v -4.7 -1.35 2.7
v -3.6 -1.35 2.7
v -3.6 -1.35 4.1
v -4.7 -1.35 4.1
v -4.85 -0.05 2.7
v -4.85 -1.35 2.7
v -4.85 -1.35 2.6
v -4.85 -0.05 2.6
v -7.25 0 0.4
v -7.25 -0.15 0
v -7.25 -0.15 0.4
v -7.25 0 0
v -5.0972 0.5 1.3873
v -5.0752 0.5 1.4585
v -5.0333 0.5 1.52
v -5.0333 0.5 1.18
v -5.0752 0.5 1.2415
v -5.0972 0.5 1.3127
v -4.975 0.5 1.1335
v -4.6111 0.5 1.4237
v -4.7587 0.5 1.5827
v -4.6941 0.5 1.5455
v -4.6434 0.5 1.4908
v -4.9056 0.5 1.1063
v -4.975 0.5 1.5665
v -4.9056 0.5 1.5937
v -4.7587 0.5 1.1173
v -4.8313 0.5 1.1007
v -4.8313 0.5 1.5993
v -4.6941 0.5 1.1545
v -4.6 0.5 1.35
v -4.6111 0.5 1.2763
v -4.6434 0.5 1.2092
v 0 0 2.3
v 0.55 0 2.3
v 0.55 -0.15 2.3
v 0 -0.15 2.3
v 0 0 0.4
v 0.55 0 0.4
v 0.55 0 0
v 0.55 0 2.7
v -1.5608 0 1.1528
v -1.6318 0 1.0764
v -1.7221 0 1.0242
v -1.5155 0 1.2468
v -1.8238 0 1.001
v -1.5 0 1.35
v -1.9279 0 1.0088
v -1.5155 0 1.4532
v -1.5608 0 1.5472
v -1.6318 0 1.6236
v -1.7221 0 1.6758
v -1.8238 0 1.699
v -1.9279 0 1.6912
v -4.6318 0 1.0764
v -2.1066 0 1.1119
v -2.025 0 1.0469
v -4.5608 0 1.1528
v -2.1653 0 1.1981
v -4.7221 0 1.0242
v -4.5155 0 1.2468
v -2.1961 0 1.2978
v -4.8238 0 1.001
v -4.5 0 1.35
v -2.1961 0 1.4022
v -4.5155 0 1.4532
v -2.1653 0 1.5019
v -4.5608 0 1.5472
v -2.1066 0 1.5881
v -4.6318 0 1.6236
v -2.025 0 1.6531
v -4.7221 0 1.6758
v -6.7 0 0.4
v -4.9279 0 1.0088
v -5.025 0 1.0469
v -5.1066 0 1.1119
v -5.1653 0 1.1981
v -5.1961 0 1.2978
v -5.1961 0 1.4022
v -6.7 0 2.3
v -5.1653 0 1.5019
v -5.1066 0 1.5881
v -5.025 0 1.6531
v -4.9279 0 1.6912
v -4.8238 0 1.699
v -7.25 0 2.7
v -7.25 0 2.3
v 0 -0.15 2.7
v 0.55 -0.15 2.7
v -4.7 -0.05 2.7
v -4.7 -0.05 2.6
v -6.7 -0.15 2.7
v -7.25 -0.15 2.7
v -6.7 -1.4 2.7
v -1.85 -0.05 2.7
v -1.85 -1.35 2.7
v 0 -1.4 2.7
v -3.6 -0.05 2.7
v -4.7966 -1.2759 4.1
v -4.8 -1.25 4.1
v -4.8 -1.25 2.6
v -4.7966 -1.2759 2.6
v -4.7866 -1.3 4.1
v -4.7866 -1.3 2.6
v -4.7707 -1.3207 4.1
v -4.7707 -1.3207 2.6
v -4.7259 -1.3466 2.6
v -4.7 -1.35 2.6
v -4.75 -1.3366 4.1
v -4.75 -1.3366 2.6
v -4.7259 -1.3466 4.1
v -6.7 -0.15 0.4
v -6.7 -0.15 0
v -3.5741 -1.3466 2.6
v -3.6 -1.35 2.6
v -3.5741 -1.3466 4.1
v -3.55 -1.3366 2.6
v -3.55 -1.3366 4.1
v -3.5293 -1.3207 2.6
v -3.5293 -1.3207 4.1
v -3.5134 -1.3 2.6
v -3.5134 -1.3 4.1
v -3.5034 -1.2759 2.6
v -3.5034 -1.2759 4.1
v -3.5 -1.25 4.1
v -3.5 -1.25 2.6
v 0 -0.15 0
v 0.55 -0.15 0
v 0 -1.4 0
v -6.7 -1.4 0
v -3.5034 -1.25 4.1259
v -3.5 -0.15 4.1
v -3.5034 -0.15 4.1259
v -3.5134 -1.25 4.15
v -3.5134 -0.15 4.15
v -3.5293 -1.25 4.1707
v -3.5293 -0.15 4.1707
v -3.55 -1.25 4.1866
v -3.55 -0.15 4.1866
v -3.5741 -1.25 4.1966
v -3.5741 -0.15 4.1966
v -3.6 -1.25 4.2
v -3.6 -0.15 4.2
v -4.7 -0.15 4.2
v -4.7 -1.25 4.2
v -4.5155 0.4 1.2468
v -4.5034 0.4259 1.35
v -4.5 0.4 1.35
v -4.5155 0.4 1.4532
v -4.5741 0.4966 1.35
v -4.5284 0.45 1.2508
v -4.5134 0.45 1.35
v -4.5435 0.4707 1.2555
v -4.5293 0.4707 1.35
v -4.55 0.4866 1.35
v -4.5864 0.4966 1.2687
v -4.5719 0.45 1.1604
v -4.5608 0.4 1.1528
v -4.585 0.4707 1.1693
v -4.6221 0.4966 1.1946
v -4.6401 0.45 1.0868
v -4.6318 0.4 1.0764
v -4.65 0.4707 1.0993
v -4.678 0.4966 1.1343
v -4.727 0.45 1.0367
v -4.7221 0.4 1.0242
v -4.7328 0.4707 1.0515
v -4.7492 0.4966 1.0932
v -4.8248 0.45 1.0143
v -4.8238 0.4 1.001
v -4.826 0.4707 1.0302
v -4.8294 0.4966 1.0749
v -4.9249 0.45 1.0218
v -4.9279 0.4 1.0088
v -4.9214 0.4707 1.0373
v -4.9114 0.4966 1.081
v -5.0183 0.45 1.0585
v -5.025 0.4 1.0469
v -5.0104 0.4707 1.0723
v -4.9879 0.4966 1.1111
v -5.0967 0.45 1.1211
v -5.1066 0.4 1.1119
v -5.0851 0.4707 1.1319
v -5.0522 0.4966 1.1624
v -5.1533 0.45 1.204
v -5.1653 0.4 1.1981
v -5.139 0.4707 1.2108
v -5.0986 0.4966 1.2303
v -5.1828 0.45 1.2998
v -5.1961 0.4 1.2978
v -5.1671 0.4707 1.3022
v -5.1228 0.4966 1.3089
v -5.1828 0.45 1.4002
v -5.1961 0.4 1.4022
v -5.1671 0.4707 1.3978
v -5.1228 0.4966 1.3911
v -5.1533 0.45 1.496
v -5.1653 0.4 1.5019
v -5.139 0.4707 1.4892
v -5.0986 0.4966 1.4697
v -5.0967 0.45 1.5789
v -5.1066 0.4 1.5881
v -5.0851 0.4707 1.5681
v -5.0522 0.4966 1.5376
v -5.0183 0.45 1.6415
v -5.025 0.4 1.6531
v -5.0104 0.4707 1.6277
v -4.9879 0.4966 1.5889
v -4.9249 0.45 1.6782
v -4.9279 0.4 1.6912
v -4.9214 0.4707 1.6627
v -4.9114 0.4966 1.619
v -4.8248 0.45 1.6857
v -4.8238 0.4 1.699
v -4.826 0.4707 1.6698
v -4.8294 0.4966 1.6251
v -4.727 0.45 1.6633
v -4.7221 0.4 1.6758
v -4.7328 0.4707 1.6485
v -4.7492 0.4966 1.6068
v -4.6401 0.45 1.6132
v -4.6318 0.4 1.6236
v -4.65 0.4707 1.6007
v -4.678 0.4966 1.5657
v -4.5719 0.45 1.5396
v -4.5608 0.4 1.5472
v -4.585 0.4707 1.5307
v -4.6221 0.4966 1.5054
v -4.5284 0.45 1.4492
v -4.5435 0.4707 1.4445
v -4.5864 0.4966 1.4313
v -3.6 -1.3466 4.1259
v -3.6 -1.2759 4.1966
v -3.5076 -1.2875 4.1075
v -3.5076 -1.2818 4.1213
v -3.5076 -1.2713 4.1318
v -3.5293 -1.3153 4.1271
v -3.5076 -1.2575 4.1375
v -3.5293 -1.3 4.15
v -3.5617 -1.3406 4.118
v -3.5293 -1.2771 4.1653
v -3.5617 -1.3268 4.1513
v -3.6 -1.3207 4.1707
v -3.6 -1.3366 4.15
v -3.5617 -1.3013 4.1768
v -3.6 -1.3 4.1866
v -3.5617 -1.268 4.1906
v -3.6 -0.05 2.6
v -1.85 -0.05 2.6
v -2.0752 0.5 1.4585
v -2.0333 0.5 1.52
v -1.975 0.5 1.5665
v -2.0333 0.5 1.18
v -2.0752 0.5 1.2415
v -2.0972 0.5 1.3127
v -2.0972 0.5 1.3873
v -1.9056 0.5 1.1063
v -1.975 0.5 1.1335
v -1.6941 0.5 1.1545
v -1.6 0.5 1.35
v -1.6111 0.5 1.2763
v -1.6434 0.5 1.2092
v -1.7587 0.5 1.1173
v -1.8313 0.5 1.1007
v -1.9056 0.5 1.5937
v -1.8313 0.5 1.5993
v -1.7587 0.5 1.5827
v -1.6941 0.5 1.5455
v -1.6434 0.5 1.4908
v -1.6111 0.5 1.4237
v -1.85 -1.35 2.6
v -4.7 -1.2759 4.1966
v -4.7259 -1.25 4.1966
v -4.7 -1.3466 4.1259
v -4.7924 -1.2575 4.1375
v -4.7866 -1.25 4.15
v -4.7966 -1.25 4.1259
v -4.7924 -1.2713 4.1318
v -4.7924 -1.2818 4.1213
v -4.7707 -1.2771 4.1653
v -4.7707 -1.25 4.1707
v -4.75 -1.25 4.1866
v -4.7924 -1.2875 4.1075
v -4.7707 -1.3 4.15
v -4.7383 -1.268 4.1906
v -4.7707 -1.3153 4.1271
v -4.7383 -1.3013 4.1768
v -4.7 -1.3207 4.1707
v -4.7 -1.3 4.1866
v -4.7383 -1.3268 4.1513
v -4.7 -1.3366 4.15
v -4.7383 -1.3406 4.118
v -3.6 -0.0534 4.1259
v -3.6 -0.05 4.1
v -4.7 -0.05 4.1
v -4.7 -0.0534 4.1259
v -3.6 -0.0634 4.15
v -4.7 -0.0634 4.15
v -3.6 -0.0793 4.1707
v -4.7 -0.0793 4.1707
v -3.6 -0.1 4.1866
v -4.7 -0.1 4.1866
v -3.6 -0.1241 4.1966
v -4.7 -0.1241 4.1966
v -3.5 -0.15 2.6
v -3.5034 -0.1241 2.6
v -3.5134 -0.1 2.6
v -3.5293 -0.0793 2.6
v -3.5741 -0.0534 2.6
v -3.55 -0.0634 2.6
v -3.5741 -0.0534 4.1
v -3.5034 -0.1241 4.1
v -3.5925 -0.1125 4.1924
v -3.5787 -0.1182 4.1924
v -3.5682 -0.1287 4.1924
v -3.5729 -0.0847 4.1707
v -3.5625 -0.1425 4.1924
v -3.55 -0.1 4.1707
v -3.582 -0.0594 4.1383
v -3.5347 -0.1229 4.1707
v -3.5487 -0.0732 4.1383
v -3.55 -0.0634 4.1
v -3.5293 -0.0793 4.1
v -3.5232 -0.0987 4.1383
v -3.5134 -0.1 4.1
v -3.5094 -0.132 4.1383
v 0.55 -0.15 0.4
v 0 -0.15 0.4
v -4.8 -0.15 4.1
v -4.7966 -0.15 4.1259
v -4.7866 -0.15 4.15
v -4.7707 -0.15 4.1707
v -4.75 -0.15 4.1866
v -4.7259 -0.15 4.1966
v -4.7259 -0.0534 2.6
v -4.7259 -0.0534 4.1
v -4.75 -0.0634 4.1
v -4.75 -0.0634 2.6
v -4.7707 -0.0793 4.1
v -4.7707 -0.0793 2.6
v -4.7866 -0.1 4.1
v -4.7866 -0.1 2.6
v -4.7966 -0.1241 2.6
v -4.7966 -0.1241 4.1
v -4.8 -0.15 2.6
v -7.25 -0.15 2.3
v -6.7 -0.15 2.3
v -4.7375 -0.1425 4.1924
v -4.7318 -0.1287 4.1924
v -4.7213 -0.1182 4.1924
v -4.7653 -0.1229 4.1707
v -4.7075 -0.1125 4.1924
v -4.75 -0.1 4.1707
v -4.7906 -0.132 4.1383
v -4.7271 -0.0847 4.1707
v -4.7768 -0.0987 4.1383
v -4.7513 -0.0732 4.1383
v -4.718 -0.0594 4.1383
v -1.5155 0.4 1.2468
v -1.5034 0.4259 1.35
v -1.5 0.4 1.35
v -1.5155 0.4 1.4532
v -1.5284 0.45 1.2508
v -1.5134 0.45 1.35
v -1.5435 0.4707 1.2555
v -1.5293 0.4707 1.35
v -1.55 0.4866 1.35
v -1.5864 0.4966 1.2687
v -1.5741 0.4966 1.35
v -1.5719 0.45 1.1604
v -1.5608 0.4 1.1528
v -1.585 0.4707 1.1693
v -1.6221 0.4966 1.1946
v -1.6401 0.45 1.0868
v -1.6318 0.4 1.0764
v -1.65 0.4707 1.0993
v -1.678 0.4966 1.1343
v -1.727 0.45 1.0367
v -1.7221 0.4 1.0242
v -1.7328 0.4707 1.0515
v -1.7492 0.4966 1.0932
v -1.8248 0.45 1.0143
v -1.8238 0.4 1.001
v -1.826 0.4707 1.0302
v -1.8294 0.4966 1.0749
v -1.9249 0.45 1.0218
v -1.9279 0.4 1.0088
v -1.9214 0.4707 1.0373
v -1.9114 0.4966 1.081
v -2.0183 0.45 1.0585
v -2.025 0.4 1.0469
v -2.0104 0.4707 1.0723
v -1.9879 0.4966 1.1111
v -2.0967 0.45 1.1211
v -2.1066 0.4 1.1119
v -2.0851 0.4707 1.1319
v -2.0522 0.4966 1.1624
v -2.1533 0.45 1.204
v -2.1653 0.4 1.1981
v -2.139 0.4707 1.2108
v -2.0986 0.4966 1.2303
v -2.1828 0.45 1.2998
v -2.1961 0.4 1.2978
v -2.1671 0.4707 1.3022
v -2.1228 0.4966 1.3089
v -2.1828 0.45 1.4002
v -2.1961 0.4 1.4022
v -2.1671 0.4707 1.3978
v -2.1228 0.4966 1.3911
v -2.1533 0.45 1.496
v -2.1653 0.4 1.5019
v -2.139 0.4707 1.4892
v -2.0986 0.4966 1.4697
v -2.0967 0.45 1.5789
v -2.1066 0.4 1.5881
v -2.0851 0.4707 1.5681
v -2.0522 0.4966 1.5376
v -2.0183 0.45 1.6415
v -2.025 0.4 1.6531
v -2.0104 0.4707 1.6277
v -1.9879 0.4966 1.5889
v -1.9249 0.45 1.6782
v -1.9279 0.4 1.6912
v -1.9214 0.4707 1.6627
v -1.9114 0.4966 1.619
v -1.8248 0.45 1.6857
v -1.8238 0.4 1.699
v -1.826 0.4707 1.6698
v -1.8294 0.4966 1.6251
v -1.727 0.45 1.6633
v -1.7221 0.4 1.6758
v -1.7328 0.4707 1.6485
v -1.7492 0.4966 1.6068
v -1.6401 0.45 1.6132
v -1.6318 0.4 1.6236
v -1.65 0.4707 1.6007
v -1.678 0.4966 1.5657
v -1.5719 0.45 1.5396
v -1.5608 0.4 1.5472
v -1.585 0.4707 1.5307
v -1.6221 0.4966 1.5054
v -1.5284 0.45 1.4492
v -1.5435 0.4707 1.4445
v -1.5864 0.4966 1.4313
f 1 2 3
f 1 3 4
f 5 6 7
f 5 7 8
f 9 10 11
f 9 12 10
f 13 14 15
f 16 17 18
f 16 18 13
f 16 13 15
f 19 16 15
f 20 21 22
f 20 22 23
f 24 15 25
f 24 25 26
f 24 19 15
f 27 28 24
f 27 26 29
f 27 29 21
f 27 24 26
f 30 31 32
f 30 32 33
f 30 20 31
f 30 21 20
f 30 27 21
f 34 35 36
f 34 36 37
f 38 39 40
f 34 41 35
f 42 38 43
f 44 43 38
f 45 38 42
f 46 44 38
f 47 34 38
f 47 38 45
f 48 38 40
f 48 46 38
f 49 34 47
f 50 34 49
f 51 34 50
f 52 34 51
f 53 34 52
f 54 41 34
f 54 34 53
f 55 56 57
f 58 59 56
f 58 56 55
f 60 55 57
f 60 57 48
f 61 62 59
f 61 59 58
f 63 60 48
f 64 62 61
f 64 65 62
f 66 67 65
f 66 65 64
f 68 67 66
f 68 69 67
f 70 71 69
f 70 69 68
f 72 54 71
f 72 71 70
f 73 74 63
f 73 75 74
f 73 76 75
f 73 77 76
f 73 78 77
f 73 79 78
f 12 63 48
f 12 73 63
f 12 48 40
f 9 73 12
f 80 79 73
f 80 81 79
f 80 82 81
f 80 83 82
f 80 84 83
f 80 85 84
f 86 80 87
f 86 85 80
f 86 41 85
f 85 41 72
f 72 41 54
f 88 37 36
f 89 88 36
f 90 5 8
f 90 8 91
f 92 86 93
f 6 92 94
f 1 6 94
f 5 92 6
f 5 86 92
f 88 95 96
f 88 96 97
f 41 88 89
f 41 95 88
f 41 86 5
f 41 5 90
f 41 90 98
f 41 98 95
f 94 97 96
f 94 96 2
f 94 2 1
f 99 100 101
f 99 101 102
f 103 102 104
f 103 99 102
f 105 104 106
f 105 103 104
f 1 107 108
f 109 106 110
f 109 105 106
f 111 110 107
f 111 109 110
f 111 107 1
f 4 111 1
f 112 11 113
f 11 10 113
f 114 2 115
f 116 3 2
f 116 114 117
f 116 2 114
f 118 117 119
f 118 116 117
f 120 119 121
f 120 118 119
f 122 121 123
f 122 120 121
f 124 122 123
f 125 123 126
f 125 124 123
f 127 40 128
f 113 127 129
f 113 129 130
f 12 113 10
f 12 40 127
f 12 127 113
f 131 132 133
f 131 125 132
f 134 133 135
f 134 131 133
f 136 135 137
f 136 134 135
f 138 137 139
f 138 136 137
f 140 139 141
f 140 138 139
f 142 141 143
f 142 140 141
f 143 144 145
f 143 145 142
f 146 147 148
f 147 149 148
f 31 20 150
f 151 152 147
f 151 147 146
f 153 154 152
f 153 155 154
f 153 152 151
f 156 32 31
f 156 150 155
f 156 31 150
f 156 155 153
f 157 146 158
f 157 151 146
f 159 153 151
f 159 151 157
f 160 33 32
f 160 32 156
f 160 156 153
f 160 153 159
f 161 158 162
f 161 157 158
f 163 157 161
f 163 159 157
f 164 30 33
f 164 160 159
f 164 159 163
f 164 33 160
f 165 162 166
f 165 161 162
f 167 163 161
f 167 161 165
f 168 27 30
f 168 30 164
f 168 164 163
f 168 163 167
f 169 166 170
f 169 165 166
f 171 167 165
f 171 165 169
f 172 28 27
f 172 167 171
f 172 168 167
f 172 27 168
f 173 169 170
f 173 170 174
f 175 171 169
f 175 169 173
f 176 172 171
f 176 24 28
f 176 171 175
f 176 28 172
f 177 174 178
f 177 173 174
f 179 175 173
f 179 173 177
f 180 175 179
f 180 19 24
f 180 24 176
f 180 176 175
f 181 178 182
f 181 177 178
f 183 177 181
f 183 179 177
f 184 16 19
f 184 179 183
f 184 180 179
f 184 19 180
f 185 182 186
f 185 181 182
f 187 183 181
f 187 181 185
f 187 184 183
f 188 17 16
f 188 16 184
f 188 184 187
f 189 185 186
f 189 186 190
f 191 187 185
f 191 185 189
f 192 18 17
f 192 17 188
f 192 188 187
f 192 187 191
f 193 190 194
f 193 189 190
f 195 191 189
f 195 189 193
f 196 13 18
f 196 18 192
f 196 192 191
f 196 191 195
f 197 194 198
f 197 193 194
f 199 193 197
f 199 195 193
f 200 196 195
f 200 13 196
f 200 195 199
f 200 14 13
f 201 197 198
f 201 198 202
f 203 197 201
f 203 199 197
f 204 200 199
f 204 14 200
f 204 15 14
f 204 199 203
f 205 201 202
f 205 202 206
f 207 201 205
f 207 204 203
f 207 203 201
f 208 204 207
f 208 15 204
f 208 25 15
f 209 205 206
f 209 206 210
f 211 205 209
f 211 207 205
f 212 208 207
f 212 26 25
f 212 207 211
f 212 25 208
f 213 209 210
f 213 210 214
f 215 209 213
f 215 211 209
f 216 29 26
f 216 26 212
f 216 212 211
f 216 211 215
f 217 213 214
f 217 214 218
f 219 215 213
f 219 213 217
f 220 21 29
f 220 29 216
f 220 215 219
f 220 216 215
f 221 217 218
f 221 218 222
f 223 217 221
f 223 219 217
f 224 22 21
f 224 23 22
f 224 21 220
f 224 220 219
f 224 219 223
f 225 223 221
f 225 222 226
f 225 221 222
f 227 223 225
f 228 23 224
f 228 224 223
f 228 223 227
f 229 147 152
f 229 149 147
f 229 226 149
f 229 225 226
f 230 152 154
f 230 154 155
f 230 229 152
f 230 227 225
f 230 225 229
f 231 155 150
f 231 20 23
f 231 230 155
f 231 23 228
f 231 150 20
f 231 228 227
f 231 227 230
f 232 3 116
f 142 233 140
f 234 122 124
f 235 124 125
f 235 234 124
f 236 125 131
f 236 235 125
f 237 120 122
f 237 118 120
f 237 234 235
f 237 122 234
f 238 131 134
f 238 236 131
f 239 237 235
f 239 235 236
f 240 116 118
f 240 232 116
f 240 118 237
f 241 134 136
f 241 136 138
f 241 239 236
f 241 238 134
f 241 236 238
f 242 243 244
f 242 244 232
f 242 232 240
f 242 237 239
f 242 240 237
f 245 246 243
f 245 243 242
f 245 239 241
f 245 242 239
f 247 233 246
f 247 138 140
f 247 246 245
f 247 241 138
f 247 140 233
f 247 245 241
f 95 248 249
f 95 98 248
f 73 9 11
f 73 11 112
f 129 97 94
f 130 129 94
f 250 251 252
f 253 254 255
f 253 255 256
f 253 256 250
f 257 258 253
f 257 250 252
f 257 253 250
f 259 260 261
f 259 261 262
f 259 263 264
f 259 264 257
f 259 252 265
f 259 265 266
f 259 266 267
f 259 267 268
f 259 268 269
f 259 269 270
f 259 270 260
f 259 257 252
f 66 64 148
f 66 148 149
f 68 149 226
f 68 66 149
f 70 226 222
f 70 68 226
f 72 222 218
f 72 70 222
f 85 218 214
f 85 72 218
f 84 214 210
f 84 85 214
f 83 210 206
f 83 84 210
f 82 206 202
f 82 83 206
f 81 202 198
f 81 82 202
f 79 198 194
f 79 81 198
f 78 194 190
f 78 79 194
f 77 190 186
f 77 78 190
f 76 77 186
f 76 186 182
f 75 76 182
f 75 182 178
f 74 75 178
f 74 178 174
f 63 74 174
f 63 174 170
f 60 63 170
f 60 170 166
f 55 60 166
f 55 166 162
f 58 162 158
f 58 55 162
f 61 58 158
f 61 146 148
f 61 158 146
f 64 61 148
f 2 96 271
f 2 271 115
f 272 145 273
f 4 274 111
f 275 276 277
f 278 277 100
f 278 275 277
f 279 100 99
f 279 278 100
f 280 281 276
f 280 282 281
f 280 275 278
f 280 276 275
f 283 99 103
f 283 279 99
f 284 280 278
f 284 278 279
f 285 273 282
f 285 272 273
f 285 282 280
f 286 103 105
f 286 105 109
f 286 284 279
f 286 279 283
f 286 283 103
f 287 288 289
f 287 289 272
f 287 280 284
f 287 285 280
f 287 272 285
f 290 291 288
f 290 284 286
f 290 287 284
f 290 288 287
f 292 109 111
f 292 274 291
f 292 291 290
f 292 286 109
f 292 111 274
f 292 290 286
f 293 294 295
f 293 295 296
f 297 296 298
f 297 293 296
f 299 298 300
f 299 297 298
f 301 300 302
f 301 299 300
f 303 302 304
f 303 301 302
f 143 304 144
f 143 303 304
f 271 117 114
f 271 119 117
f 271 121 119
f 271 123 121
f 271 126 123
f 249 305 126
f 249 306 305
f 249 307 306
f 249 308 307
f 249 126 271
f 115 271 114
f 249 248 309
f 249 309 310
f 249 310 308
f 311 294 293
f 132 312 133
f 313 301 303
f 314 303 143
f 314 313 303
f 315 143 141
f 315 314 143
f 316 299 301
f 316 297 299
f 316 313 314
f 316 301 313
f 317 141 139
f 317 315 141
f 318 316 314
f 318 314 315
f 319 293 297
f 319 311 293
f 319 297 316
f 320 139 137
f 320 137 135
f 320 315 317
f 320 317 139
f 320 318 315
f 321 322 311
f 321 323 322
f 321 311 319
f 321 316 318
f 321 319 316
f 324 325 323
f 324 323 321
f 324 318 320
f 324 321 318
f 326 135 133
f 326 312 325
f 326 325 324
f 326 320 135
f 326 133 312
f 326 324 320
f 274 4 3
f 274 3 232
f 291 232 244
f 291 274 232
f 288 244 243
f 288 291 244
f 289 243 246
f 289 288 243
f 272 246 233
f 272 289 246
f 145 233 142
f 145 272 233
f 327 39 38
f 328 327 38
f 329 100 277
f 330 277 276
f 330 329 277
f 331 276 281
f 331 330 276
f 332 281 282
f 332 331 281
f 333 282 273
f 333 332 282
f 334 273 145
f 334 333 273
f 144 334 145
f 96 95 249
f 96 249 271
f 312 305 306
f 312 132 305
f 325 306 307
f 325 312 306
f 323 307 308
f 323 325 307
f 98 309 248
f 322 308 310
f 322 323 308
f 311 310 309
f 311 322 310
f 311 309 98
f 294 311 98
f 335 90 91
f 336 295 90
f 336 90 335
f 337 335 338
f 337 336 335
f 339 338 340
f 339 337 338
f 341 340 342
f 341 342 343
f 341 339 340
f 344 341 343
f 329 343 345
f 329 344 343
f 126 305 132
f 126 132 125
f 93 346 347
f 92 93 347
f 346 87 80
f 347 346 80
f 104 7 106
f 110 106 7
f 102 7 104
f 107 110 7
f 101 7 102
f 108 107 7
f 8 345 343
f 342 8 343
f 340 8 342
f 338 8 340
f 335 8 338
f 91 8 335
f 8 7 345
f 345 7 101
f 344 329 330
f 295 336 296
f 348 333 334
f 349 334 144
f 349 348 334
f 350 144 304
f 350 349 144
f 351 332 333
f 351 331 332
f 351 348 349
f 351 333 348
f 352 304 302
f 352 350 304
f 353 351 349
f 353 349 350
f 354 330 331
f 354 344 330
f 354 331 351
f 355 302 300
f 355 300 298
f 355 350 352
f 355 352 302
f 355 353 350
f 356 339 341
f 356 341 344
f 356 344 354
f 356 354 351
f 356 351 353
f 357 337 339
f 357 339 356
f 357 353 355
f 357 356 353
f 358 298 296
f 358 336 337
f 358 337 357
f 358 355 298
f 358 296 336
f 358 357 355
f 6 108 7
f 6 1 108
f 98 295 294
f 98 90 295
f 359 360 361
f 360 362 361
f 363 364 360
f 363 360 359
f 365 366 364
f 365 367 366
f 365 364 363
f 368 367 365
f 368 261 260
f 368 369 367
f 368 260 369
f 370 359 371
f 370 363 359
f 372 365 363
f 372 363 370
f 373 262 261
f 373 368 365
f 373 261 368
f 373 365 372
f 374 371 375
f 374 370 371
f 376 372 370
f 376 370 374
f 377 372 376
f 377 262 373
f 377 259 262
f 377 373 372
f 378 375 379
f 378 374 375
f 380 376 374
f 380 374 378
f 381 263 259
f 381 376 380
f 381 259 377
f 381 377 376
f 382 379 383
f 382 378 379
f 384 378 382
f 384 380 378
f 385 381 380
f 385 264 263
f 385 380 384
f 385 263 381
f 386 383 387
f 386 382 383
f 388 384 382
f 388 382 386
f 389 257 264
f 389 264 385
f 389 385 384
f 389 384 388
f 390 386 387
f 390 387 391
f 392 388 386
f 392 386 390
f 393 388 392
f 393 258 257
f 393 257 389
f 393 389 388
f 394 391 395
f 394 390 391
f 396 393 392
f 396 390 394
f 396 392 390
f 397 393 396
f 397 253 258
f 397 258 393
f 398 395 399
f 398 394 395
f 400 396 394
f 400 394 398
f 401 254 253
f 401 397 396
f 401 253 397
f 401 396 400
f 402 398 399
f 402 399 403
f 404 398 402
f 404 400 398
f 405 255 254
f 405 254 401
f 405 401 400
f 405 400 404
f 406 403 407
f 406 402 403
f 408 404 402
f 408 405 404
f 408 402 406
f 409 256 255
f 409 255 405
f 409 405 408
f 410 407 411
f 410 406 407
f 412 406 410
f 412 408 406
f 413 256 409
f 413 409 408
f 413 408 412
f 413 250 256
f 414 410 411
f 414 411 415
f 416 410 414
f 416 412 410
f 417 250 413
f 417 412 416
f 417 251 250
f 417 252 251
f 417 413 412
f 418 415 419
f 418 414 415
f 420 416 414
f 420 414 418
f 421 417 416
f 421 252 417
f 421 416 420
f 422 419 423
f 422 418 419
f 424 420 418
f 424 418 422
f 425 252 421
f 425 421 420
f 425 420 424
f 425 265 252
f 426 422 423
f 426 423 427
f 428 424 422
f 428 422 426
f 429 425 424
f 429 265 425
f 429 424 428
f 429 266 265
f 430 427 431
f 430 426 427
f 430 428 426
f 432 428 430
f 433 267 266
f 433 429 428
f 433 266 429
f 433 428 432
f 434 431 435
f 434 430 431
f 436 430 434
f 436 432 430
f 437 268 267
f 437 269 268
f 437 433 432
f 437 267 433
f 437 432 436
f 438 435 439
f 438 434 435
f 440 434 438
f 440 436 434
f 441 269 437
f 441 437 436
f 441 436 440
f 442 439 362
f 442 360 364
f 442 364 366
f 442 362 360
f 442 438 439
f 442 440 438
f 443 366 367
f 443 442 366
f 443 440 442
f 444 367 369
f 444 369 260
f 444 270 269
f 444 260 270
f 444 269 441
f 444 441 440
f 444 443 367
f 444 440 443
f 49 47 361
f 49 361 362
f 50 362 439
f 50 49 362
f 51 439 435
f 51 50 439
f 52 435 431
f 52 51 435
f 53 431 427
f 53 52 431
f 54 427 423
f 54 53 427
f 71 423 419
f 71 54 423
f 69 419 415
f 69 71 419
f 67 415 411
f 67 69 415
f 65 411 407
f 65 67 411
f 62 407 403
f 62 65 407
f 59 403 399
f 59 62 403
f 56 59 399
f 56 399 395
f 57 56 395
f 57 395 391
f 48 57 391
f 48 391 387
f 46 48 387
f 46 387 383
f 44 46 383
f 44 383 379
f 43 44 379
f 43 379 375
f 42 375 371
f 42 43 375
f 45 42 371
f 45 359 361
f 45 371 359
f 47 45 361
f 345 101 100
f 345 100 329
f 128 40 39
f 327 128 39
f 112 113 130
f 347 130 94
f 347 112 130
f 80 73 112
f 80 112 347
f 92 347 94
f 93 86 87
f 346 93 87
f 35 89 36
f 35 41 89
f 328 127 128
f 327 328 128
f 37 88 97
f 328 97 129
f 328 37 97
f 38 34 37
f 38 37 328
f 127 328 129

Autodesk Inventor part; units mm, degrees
ref_plane "YZ Plane" through (0, 0, 0) normal (1, 0, 0) x (0, 1, 0)
ref_plane "XZ Plane" through (0, 0, 0) normal (0, 1, 0) x (-1, 0, 0)
ref_plane "XY Plane" through (0, 0, 0) normal (0, 0, 1) x (1, 0, 0)
sketch "Эскиз1" plane through (0, 0, 0) normal (0, 1, 0) x (-1, 0, 0)
  line L0 (0, 0) -> (6.7, 0)
  line L1 (6.7, 0) -> (6.7, 2.7)
  line L2 (6.7, 2.7) -> (0, 2.7)
  line L3 (0, 2.7) -> (0, 0)
  dimension "d0" = 6.7
  dimension "d1" = 2.7
extrude "Выдавливание1" add sketch "Эскиз1" against normal blind 1.4
sketch "Эскиз2" plane through (0, 0, 0) normal (0, 1, 0) x (1, 0, 0)
  line L0 (0, 0) -> (-6.7, 0) projected
  circle A0 centre (-4.85, -1.35) radius 0.35
  circle A1 centre (-1.85, -1.35) radius 0.35
  point P0 (0, -2.7)
  dimension "d4" = 0.7
  dimension "d6" = 1.35
  dimension "d7" = 2.7
  dimension "d9" = 1.35
  dimension "d10" = 3
  dimension "d11" = 1.85
  dimension "d12" = 6.7
extrude "Выдавливание2" add sketch "Эскиз2" along normal blind 0.5
sketch "Эскиз3" plane through (-6.7, 0, 2.7) normal (0, 0, 1) x (1, 0, 0)
  line L0 (0, 0) -> (6.7, 0) projected
  line L1 (1.9, -0.05) -> (3.2, -0.05)
  line L2 (3.2, -0.05) -> (3.2, -1.35)
  line L3 (3.2, -1.35) -> (1.9, -1.35)
  line L4 (1.9, -1.35) -> (1.9, -0.05)
  line L5 (1.85, -0.05) -> (4.85, -0.05)
  line L6 (4.85, -0.05) -> (4.85, -1.35)
  line L7 (4.85, -1.35) -> (1.85, -1.35)
  line L8 (1.85, -1.35) -> (1.85, -0.05)
  line L9 (3.5, -0.05) -> (4.8, -0.05)
  line L10 (4.8, -0.05) -> (4.8, -1.35)
  line L11 (4.8, -1.35) -> (3.5, -1.35)
  line L12 (3.5, -1.35) -> (3.5, -0.05)
  point P0 (0, -1.4)
  point P1 (6.7, -1.4)
  dimension "d15" = 1.3
  dimension "d16" = 1.3
  dimension "d18" = 0.05
  dimension "d20" = 3
  dimension "d21" = 1.3
  dimension "d22" = 1.85
  dimension "d23" = 6.7
  dimension "d24" = 0.05
  dimension "d25" = 0.05
  dimension "d51" = 1.3
  dimension "d52" = 1.3
  dimension "d53" = 0.05
extrude "Выдавливание3" add sketch "Эскиз3" along normal blind 1.5 contours L1 L2 L3 L4
sketch "Эскиз4" plane through (0, 0, 0) normal (0, 1, 0) x (1, 0, 0)
  line L0 (0, 0) -> (0.55, 0)
  line L1 (0.55, 0) -> (0.55, -0.4)
  line L2 (0.55, -0.4) -> (0, -0.4)
  line L3 (0, -0.4) -> (0, 0)
  line L4 (0, -2.7) -> (0.55, -2.7)
  line L5 (0.55, -2.7) -> (0.55, -2.3)
  line L6 (0.55, -2.3) -> (0, -2.3)
  line L7 (0, -2.3) -> (0, -2.7)
  line L8 (-6.7, -2.7) -> (-7.25, -2.7)
  line L9 (-7.25, -2.7) -> (-7.25, -2.3)
  line L10 (-7.25, -2.3) -> (-6.7, -2.3)
  line L11 (-6.7, -2.3) -> (-6.7, -2.7)
  line L12 (-6.7, 0) -> (-7.25, 0)
  line L13 (-7.25, 0) -> (-7.25, -0.4)
  line L14 (-7.25, -0.4) -> (-6.7, -0.4)
  line L15 (-6.7, -0.4) -> (-6.7, 0)
  dimension "d28" = 0.55
  dimension "d29" = 0.4
  dimension "d30" = 0.4
  dimension "d31" = 0.55
  dimension "d32" = 0.4
  dimension "d33" = 0.4
extrude "Выдавливание4" add sketch "Эскиз4" against normal blind 0.15
fillet "Сопряжение1" radius 0.1 2 edges at (-5.2, 0.5, 1.35) (-2.2, 0.5, 1.35)
fillet "Сопряжение2" radius 0.1 8 edges at (-4.8, -0.05, 3.45) (-3.5, -0.05, 3.45) (-4.15, -0.05, 4.2) (-4.15, -1.35, 4.2) (-3.5, -0.7, 4.2) (-3.5, -1.35, 3.45) (-4.8, -1.35, 3.45) (-4.8, -0.7, 4.2)
fillet "Сопряжение2" radius 0.1 2 edges at (-4.15, -0.05, 4.2) (-4.15, -1.35, 4.2)
sketch "Эскиз6" plane through (-6.7, -1.4, 2.7) normal (0, 0, 1) x (1, 0, 0)
  line L0 (3.2, 1.25) -> (3.2, 0.15) projected
  arc A0 (3.1, 0.05) -> (3.2, 0.15) centre (3.1, 0.15) ccw projected
  arc A1 (1.9, 0.15) -> (2, 0.05) centre (2, 0.15) ccw projected
  line L1 (1.9, 0.15) -> (1.9, 1.25) projected
  arc A2 (2, 1.35) -> (1.9, 1.25) centre (2, 1.25) ccw projected
  arc A3 (3.2, 1.25) -> (3.1, 1.35) centre (3.1, 1.25) ccw projected
  line L2 (0, 0) -> (6.7, 0)
  line L3 (1.85, 1.35) -> (4.85, 1.35) projected
  line L4 (4.85, 1.35) -> (4.85, 0.05) projected
  line L5 (1.85, 0.05) -> (1.85, 1.35) projected
  line L6 (4.85, 0.05) -> (1.85, 0.05) projected
extrude "Выдавливание5" cut sketch "Эскиз6" against normal blind 0.1 contours A3 L3 L4 L6 A0 L0 | A2 L1 A1 L6 L5 L3
sketch "Эскиз7" plane through (0, 0, 0) normal (0, 1, 0) x (1, 0, 0)
  circle A0 centre (-4.85, -1.35) radius 0.35 projected
  circle A1 centre (-1.85, -1.35) radius 0.35 projected
  line L0 (0.55, 0) -> (-7.25, 0) projected
  line L1 (-7.25, 0) -> (-7.25, -0.4) projected
  line L2 (-7.25, -0.4) -> (-6.7, -0.4) projected
  line L3 (-6.7, -0.4) -> (-6.7, -2.3) projected
  line L4 (-6.7, -2.3) -> (-7.25, -2.3) projected
  line L5 (-7.25, -2.3) -> (-7.25, -2.7) projected
  line L6 (-7.25, -2.7) -> (0.55, -2.7) projected
  line L7 (0.55, -2.7) -> (0.55, -2.3) projected
  line L8 (0.55, -2.3) -> (0, -2.3) projected
  line L9 (0, -2.3) -> (0, -0.4) projected
  line L10 (0, -0.4) -> (0.55, -0.4) projected
  line L11 (0.55, -0.4) -> (0.55, 0) projected
  point P0 (0, 0)
  dimension "d49" = 1.35
  dimension "d50" = 3
sketch "Эскиз8" plane through (-6.7, -1.4, 2.7) normal (0, 0, 1) x (1, 0, 0)
  line L0 (1.85, 1.35) -> (2, 1.35) projected
  line L1 (2, 1.35) -> (3.1, 1.35) projected
  line L2 (3.1, 1.35) -> (2, 1.35) projected
  line L3 (3.6, 1.35) -> (4.7, 1.35) projected
  line L4 (1.85, 1.35) -> (4.85, 1.35) projected
  line L5 (4.85, 1.35) -> (4.85, 0.05) projected
  line L6 (4.85, 0.05) -> (3.1, 0.05) projected
  line L7 (4.7, 0.05) -> (3.6, 0.05) projected
  line L8 (4.85, 0.05) -> (3.1, 0.05) projected
  line L9 (3.1, 0.05) -> (2, 0.05) projected
  line L10 (2, 0.05) -> (1.85, 0.05) projected
  line L11 (1.85, 0.05) -> (1.85, 1.35) projected
equation "\"d6\" = 0.5 * d7"
equation "\"d9\" = d6"
equation "\"d11\" = -0.5 * d10 + 0.5 * d12"
equation "\"d22\" = -0.5 * d20 + 0.5 * d23"
properties part number "msk12c02"
